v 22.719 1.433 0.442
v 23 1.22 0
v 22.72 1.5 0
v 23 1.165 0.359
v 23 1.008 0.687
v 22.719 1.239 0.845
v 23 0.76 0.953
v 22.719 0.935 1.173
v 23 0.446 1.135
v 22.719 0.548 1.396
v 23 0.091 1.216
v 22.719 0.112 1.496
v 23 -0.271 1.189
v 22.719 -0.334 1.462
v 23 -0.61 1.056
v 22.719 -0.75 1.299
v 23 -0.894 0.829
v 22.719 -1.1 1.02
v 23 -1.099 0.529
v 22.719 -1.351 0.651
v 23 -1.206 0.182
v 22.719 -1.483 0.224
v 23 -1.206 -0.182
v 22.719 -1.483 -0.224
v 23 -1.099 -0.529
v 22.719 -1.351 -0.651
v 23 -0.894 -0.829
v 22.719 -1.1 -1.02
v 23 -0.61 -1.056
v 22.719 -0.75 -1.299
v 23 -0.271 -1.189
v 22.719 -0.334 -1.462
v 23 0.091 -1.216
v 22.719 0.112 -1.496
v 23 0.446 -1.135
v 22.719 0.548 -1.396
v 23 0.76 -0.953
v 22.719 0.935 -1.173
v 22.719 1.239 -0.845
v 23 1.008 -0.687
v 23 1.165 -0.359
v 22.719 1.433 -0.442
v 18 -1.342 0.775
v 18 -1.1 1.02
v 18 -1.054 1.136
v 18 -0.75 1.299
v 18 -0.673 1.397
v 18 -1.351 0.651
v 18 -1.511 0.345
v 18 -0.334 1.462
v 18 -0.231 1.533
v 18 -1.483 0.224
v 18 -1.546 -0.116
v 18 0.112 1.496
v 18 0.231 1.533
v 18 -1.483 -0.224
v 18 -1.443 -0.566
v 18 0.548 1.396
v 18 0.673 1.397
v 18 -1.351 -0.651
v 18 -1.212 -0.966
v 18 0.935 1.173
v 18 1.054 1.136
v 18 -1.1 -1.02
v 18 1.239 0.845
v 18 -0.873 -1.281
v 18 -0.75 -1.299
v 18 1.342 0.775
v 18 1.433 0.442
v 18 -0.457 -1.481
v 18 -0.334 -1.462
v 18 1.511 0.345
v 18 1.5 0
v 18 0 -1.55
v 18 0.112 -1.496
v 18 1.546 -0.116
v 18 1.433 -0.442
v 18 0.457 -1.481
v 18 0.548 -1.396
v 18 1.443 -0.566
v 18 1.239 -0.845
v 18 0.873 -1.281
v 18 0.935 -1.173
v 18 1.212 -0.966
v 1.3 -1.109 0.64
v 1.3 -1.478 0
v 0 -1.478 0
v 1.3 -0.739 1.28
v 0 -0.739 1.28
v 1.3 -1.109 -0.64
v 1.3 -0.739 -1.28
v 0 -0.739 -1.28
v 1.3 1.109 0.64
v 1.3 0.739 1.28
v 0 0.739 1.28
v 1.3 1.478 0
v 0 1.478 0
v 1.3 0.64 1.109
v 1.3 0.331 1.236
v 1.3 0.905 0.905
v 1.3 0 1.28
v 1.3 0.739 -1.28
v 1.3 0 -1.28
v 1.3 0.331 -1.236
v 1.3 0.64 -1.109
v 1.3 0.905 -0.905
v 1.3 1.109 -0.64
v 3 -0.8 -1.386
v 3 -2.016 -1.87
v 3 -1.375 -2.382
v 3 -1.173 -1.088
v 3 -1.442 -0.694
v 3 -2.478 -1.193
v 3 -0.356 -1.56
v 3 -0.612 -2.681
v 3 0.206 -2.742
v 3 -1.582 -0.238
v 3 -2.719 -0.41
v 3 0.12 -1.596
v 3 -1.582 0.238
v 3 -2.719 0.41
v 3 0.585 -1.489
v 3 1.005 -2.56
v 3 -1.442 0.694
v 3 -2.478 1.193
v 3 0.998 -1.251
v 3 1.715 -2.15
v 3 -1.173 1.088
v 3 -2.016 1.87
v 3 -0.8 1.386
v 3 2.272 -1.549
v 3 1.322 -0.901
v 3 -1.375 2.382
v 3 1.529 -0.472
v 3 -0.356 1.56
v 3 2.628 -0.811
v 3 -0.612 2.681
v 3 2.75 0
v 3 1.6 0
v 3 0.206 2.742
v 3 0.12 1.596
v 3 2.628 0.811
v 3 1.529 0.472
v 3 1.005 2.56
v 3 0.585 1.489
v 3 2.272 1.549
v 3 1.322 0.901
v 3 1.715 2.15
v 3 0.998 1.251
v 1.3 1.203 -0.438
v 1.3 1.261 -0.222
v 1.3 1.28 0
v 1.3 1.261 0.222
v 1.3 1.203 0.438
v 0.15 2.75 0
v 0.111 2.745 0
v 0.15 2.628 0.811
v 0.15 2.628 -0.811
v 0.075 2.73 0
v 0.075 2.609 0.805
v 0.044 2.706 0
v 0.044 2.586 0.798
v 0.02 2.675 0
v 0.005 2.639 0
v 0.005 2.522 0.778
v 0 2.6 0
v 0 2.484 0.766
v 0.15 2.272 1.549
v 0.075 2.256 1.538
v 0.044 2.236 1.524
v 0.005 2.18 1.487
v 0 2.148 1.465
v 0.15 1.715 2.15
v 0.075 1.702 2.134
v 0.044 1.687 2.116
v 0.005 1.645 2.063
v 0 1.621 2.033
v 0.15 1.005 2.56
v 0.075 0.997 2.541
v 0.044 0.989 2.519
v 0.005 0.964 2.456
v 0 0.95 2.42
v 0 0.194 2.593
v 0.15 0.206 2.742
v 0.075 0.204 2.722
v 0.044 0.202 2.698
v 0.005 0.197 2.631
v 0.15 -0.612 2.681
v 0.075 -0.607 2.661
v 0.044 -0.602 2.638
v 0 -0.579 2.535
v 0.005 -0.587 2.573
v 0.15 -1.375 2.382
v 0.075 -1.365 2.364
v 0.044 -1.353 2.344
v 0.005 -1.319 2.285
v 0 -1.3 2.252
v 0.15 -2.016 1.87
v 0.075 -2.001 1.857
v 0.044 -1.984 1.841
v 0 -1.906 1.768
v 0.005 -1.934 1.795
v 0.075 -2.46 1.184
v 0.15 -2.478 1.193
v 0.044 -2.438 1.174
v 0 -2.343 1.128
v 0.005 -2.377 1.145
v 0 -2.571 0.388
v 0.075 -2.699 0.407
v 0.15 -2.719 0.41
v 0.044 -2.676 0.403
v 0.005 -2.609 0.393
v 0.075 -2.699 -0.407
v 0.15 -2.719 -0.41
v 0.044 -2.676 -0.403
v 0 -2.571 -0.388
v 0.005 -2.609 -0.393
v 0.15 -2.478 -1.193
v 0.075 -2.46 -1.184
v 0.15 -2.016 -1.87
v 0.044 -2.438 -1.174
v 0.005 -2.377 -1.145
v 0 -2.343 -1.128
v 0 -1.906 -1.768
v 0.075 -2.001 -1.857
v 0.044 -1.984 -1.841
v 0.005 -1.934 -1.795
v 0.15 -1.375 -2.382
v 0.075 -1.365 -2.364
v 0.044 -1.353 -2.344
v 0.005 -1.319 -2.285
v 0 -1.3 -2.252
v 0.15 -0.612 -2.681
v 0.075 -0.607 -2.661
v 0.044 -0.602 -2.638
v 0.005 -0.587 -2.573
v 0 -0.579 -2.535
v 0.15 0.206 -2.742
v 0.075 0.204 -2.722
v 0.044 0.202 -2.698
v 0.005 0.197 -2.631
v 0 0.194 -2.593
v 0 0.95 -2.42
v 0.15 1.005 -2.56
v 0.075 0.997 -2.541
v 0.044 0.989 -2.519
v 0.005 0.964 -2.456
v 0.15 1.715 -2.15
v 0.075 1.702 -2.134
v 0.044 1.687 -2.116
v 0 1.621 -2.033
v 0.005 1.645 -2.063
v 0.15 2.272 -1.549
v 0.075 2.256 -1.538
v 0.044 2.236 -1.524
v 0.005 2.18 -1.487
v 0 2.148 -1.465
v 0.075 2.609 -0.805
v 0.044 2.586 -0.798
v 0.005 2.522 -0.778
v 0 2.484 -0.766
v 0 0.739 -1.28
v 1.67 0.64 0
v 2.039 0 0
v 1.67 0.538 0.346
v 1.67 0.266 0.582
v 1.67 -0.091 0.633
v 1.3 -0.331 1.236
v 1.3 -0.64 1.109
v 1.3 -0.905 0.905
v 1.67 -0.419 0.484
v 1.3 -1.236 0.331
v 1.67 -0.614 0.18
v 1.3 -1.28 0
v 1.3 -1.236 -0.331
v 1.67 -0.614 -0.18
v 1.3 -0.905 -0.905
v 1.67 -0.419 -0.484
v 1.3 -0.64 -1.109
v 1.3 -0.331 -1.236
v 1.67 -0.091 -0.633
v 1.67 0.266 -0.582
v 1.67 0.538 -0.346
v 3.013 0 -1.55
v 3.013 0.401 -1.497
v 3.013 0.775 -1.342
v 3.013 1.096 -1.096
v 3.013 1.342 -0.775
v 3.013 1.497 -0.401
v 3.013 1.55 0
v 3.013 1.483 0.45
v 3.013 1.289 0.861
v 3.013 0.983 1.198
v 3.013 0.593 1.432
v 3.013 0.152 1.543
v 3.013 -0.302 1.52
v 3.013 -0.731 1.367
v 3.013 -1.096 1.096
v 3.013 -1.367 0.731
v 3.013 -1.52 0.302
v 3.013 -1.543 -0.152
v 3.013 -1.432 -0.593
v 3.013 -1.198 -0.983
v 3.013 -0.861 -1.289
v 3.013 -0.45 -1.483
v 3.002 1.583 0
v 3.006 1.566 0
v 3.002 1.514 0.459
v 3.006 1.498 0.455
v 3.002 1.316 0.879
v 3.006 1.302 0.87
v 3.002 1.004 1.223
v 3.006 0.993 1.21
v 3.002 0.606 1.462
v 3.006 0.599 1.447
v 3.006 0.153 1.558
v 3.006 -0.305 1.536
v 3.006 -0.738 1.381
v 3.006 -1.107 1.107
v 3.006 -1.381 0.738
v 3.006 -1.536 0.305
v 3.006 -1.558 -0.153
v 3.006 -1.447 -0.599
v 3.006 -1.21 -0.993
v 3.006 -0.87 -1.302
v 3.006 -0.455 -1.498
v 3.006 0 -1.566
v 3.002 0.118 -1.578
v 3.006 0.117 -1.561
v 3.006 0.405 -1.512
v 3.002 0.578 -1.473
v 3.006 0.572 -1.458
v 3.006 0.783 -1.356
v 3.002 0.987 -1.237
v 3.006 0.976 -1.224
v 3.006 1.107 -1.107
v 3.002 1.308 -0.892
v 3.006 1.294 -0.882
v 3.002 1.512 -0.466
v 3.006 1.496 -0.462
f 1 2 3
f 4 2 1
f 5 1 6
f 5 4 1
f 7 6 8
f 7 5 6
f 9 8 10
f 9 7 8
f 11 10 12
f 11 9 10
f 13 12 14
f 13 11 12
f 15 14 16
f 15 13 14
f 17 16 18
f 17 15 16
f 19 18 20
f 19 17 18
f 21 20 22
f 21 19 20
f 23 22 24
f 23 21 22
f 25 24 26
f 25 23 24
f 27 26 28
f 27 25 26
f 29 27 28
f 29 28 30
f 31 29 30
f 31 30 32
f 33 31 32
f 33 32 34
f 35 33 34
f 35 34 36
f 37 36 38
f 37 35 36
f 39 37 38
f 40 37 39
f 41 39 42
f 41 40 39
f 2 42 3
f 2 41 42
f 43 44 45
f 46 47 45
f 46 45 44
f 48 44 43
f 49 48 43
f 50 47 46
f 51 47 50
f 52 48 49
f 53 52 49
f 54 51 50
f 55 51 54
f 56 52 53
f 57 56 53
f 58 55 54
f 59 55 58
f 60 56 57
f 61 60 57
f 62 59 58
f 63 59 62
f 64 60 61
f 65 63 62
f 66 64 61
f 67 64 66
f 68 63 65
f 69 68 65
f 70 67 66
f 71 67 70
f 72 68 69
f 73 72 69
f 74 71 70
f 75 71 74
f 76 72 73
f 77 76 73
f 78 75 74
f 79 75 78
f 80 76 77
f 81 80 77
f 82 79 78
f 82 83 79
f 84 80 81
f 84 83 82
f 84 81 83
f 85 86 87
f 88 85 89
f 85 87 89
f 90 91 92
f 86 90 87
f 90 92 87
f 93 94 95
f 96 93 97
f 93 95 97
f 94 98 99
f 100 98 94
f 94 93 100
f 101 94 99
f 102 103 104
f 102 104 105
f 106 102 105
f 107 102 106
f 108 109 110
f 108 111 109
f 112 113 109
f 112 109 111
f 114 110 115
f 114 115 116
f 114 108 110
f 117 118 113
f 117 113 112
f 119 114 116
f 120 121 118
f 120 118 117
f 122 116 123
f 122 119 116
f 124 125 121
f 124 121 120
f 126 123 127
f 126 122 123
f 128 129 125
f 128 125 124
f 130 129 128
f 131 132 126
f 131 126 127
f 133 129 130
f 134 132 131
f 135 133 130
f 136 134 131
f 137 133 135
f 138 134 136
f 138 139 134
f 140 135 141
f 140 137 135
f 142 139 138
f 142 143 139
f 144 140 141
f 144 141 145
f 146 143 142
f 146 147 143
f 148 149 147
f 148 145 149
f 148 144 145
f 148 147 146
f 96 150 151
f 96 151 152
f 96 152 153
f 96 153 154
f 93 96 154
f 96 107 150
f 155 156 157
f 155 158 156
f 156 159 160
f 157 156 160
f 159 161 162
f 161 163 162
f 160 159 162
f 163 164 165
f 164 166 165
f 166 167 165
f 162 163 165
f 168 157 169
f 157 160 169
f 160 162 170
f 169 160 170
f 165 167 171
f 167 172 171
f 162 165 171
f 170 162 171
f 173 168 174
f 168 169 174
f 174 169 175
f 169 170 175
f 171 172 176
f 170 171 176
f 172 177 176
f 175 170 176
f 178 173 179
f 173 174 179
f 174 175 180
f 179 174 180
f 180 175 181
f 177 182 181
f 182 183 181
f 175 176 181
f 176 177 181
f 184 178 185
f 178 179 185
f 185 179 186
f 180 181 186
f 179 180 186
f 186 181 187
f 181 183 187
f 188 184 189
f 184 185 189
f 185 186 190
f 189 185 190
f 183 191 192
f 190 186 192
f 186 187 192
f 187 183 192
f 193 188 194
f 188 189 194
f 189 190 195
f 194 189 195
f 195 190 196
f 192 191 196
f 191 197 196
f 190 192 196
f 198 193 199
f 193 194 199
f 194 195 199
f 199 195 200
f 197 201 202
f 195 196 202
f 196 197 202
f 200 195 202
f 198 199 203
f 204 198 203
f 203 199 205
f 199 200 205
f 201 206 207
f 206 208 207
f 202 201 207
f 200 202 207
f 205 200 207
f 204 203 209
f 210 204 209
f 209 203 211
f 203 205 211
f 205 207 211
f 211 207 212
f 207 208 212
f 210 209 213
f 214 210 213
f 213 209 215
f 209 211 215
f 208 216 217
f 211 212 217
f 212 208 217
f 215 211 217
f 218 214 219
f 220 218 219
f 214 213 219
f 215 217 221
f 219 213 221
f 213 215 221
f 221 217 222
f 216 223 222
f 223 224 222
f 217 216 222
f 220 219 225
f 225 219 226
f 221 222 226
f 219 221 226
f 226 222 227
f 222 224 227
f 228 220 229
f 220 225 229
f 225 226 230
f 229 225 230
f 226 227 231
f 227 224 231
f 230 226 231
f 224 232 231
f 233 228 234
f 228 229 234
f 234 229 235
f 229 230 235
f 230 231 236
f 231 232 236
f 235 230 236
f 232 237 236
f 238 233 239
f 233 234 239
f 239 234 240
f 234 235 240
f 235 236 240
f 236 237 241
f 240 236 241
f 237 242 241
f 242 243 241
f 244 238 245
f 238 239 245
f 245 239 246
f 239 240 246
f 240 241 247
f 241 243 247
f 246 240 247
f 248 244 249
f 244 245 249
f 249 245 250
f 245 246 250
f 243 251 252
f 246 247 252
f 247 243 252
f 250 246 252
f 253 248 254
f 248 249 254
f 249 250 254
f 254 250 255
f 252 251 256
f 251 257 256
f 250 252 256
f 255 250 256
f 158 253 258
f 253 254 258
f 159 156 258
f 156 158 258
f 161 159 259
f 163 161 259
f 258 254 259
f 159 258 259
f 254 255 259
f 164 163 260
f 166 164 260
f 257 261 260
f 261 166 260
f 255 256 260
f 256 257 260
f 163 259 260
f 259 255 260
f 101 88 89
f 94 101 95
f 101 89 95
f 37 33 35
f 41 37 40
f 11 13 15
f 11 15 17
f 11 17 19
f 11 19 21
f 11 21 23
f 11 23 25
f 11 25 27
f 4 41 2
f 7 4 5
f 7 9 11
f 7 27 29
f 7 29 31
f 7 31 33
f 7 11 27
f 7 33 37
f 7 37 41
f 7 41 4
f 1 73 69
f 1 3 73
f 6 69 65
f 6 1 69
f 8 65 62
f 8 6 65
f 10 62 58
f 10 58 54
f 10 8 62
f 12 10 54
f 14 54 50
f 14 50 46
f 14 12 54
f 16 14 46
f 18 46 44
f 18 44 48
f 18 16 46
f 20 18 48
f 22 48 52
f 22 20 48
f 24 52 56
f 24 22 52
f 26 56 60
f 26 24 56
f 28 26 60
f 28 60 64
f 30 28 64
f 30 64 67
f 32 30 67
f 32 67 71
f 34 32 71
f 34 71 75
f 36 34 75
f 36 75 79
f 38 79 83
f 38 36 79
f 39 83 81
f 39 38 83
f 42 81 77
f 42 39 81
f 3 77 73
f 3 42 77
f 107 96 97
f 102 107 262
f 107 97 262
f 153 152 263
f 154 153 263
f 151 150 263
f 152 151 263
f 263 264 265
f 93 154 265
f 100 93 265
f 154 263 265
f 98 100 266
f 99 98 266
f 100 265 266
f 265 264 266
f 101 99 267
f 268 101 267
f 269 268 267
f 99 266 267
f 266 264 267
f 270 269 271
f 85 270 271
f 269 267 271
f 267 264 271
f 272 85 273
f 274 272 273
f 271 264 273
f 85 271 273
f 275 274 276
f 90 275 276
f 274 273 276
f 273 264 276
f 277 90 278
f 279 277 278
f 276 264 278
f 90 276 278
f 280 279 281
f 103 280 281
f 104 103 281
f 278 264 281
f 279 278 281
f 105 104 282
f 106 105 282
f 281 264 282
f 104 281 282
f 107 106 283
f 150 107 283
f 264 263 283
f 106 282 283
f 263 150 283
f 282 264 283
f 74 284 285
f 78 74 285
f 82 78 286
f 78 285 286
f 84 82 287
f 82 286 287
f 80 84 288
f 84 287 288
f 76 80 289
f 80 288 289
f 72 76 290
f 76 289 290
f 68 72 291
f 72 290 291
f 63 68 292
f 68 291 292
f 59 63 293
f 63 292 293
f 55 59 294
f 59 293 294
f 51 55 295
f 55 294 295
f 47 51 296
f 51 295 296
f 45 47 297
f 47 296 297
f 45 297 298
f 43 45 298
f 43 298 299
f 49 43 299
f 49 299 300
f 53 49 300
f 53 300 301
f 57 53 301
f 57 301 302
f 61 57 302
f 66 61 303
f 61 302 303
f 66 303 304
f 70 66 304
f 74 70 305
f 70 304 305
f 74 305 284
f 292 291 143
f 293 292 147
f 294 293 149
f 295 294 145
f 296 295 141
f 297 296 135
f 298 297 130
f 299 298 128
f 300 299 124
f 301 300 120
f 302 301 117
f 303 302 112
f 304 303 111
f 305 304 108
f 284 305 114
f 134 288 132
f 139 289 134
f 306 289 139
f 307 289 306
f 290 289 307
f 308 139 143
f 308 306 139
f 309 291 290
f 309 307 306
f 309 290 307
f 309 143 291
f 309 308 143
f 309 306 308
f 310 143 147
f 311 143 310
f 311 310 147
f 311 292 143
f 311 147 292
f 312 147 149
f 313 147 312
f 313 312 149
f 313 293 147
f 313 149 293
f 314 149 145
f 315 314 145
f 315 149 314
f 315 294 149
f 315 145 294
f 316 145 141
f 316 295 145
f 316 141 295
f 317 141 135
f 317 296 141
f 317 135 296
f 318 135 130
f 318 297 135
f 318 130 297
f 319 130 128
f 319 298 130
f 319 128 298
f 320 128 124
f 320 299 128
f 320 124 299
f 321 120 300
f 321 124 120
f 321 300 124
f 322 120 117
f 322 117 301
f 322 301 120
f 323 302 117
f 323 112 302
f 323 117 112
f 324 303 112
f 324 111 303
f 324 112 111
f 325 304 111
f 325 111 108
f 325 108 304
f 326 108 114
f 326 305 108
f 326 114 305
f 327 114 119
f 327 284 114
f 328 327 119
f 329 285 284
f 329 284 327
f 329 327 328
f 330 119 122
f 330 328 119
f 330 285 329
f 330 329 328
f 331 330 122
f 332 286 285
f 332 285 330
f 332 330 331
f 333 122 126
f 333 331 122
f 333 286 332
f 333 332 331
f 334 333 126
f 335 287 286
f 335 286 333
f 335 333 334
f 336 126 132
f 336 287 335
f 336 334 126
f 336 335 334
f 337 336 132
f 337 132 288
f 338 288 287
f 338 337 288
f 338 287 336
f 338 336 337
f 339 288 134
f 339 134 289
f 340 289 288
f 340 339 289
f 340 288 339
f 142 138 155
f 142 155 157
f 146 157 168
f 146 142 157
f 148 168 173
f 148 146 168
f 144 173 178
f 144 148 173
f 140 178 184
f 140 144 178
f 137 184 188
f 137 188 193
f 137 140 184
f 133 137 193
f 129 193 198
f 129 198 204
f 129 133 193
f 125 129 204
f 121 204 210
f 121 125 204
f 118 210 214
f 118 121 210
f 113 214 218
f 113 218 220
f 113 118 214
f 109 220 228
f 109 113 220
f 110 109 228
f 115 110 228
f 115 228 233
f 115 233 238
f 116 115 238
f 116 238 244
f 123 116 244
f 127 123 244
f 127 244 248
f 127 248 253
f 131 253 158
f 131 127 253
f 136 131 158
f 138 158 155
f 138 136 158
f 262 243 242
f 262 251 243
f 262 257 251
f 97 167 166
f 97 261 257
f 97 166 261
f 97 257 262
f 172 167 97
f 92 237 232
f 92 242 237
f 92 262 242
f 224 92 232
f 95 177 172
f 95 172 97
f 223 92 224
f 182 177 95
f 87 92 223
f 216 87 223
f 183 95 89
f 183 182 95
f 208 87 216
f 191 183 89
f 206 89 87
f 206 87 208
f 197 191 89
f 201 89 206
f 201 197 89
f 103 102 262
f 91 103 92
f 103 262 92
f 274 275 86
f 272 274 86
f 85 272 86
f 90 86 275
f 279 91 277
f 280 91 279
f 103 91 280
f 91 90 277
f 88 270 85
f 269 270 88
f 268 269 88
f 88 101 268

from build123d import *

# Parameters (mm, degrees)
FILLET1_R           = 0.1
FILLET2_R           = 0.15
HEX_2_DEPTH         = 1.3
SKETCH4_R           = 1.55
BOSS_EXTRUDE1_DEPTH = 15


with BuildPart() as part:
    # BodySke → Base-Revolve (revolve)
    with BuildSketch(Plane.XY):
        Polygon((0, 0), (0, 2.75), (3, 2.75), (3, 1.5), (22.7195, 1.5), (23, 1.2195), (23, 0), align=None)
    revolve(axis=Axis((-31.75, 0, 0), (1, 0, 0)))

    # Fillet1
    fillet1_edges = [part.edges().sort_by_distance(p)[0] for p in [
        (3, -1.5, 0),
    ]]
    fillet(fillet1_edges, radius=FILLET1_R)

    # Fillet2
    fillet2_edges = [part.edges().sort_by_distance(p)[0] for p in [
        (0, -2.75, 0),
    ]]
    fillet(fillet2_edges, radius=FILLET2_R)

    # Sketch2 → Hex-PreBroach (revolve, cut)
    with BuildSketch(Plane.XY):
        Polygon((0, 1.28), (1.3, 1.28), (2.039008345, 0), (0, 0), align=None)
    revolve(axis=Axis((0, 0, 0), (1, 0, 0)), mode=Mode.SUBTRACT)

    # Sketch3 → Hex 2 (cut)
    with BuildSketch(Plane(origin=(0, 0, 0), x_dir=(0, 0.5, 0.866025404), z_dir=(-1, 0, 0))):
        Polygon((0.739008345, 1.28), (-0.739008345, 1.28), (-1.478016689, 0), (-0.739008345, -1.28), (0.739008345, -1.28), (1.478016689, 0), align=None)
    extrude(amount=-HEX_2_DEPTH, mode=Mode.SUBTRACT)

    # Sketch4 → Boss-Extrude1 (add)
    with BuildSketch(Plane(origin=(3, 0, 0), x_dir=(0, 0, -1), z_dir=(1, 0, 0))):
        Circle(SKETCH4_R)
    extrude(amount=BOSS_EXTRUDE1_DEPTH)


solid = part.part
